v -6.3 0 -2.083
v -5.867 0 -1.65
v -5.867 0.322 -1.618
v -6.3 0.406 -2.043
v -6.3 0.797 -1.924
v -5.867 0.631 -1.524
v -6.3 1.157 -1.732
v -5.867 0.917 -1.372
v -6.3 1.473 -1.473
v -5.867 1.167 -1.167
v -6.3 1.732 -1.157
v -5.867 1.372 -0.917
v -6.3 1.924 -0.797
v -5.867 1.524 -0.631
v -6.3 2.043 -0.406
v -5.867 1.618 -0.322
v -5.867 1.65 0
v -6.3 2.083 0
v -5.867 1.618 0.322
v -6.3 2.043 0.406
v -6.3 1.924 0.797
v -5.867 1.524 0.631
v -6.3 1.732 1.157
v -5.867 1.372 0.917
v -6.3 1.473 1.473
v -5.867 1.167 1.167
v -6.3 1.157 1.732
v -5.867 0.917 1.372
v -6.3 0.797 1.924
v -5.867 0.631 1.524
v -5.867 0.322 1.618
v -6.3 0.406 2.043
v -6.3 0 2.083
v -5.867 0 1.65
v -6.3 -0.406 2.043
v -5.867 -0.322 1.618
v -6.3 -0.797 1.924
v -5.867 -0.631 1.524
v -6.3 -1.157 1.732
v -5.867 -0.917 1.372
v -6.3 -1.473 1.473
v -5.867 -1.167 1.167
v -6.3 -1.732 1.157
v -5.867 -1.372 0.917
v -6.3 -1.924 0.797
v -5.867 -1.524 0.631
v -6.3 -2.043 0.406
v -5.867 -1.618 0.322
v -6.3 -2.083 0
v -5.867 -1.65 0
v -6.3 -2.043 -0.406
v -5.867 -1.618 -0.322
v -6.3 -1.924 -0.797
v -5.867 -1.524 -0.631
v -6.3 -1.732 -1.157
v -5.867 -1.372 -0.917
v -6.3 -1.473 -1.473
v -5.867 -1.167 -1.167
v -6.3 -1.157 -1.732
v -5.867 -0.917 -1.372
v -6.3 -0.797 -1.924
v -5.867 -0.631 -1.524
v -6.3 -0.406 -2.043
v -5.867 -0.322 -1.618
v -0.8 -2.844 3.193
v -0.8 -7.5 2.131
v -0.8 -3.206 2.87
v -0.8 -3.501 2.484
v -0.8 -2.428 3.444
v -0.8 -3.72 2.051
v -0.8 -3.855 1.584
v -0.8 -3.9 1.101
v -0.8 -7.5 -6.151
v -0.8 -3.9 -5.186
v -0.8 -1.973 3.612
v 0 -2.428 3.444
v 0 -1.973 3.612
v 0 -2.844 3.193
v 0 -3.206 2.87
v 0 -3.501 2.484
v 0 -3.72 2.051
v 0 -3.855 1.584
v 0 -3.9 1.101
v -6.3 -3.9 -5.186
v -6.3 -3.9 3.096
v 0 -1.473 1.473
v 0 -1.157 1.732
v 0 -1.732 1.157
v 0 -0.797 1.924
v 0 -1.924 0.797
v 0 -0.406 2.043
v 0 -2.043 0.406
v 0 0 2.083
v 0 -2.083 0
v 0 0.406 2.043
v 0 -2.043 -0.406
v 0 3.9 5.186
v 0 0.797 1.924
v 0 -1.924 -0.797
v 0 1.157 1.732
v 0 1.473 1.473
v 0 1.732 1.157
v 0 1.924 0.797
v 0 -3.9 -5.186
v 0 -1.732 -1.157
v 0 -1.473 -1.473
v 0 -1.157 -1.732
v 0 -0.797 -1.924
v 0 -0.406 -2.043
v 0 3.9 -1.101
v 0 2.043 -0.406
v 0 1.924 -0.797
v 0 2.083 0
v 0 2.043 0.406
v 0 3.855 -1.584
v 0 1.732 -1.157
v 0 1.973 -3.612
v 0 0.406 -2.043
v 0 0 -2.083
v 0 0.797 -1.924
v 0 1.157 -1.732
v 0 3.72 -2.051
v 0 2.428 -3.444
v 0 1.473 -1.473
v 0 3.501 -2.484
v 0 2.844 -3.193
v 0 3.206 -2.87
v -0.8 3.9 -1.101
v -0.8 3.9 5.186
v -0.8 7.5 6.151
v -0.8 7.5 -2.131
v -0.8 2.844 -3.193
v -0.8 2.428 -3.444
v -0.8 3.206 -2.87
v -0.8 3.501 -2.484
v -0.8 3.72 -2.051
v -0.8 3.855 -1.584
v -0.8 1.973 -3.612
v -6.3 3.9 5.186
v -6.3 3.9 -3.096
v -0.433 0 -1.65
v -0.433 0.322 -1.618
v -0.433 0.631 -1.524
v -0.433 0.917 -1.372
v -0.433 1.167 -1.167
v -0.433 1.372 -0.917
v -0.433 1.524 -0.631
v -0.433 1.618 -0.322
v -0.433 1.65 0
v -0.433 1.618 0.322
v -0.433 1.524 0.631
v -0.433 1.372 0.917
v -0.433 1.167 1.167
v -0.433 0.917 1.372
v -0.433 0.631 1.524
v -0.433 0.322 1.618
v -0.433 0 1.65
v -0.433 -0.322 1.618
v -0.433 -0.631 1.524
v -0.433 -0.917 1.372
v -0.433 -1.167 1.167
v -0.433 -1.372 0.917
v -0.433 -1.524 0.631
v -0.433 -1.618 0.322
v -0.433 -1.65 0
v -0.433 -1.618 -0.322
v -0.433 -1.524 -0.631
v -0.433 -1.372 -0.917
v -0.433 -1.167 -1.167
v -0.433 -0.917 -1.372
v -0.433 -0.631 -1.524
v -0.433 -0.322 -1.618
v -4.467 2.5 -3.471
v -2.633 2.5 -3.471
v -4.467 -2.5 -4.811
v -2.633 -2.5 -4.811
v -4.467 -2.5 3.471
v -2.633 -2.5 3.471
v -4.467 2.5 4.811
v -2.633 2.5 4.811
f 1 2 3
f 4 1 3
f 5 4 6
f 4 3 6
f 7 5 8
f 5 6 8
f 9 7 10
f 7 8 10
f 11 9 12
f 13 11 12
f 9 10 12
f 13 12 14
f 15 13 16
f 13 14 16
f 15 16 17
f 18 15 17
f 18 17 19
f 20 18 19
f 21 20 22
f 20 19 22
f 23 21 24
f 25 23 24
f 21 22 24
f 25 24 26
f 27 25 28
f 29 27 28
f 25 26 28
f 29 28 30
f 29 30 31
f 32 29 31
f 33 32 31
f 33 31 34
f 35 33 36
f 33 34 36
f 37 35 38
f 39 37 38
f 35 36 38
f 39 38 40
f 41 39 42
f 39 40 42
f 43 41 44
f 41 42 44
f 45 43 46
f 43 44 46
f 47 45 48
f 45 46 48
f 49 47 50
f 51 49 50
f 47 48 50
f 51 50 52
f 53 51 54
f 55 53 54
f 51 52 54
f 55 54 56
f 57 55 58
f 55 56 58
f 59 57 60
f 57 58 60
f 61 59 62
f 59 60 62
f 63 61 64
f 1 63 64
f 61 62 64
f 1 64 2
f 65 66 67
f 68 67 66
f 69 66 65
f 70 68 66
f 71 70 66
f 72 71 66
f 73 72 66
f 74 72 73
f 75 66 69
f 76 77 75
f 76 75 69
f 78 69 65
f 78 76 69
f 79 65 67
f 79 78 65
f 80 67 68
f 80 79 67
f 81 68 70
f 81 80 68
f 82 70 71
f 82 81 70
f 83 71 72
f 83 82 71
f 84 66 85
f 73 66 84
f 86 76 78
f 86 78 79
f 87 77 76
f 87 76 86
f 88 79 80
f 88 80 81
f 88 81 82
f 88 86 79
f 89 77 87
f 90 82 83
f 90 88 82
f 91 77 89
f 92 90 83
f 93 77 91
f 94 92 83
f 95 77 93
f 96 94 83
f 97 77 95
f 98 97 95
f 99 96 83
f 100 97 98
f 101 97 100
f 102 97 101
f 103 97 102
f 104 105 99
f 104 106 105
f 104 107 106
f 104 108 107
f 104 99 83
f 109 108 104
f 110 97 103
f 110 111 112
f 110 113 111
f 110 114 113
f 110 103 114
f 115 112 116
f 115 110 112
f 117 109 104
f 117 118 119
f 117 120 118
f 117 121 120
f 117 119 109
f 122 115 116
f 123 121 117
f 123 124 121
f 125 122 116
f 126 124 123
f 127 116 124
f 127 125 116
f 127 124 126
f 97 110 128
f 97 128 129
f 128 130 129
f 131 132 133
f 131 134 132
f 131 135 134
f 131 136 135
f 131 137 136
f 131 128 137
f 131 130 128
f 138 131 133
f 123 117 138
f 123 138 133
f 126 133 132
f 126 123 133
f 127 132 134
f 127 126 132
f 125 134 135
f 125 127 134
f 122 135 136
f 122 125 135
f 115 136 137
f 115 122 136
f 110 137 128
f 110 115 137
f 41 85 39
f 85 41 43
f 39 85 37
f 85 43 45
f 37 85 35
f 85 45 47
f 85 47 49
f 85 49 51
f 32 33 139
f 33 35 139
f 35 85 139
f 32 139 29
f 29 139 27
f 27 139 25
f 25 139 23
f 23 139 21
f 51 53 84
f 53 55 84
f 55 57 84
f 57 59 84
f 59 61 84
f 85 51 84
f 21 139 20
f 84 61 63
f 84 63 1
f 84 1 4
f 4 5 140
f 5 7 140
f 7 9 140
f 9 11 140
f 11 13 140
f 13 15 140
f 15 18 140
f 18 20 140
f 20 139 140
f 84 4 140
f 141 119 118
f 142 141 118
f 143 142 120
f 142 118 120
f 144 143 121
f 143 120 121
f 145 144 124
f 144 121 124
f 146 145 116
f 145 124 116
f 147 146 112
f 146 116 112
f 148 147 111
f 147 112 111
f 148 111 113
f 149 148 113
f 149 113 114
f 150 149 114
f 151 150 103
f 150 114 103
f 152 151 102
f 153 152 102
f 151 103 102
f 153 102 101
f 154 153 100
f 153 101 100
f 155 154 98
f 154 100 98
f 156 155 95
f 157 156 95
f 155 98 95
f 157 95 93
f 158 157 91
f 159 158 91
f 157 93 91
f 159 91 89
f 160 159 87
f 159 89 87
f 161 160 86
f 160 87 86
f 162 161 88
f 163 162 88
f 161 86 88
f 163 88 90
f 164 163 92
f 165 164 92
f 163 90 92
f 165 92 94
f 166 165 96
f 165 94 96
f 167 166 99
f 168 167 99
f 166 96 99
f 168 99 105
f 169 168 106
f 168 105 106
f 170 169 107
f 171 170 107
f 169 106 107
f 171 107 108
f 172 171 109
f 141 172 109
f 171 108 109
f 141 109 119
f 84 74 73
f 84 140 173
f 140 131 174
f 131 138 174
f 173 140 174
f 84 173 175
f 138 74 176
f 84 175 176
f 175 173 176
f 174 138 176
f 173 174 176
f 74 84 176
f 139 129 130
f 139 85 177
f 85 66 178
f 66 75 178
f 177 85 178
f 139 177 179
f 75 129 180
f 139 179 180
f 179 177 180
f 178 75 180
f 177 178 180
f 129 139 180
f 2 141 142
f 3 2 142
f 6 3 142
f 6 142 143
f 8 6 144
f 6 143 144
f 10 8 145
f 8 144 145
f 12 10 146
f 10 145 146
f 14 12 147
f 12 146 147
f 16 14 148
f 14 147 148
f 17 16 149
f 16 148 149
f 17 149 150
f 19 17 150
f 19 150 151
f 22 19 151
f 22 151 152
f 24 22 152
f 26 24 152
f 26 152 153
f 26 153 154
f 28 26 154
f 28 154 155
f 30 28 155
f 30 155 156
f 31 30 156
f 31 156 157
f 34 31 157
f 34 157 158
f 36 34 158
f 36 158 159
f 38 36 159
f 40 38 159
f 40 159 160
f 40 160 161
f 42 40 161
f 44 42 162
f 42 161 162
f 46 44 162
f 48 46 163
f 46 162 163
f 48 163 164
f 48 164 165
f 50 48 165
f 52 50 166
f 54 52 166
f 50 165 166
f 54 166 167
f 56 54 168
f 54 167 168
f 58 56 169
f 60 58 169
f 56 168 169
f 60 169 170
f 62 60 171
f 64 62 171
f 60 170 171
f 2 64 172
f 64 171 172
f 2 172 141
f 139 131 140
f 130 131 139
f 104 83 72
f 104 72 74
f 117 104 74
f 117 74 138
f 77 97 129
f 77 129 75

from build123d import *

# Parameters (mm, degrees)
EXTRUDE1_DEPTH        = 0.8
EXTRUDE2_DEPTH        = 5.5
DRAFT1_ANGLE          = -33.206570315
DRAFT2_ANGLE          = -33.206570315
M4_TAPPED_HOLE1_D     = 3.3
M4_TAPPED_HOLE1_DEPTH = 6.3
CHAMFER1_SIZE         = 0.433


with BuildPart() as part:
    # Sketch1 → Extrude1 (new body)
    with BuildSketch(Plane(origin=(0, 0, 0), x_dir=(0, 0, -1), z_dir=(1, 0, 0))):
        with BuildLine():
            Line((1.101052702, 3.9), (-5.186106572, 3.9))
            Line((-5.186106572, 3.9), (-3.612459851, -1.972929517))
            ThreePointArc((-3.612459851, -1.972929517), (-2.683832418, -3.362718685), (-1.101052702, -3.9))
            Line((-1.101052702, -3.9), (5.186106572, -3.9))
            Line((5.186106572, -3.9), (3.612459851, 1.972929517))
            ThreePointArc((3.612459851, 1.972929517), (2.683832418, 3.362718685), (1.101052702, 3.9))
        make_face()
    extrude(amount=-EXTRUDE1_DEPTH)

    # Sketch2 → Extrude2 (add)
    with BuildSketch(Plane.ZY.offset(0.8)):
        with BuildLine():
            Line((2.131485778, -7.5), (-6.150723665, -7.5))
            add(Edge.make_bspline(
                [(-2.131485778, 7.5), (-3.471231741, 2.5), (-4.810977703, -2.5), (-6.150723665, -7.5)],
                knots=[0, 0, 0, 0, 1, 1, 1, 1], degree=3))
            Line((-2.131485778, 7.5), (6.150723665, 7.5))
            add(Edge.make_bspline(
                [(2.131485778, -7.5), (3.471231741, -2.5), (4.810977703, 2.5), (6.150723665, 7.5)],
                knots=[0, 0, 0, 0, 1, 1, 1, 1], degree=3))
        make_face()
    extrude(amount=EXTRUDE2_DEPTH)

    # Draft1
    draft1_faces = [part.faces().sort_by_distance(p)[0] for p in [
        (-3.55, 7.5, 2.009618943),
    ]]
    draft(draft1_faces, Plane(origin=(-0.8, 0, 4.141104722), x_dir=(0, 0, 1), z_dir=(1, 0, 0)), DRAFT1_ANGLE)

    # Draft2
    draft2_faces = [part.faces().sort_by_distance(p)[0] for p in [
        (-3.55, -7.5, -2.009618943),
    ]]
    draft(draft2_faces, Plane(origin=(-0.8, 0, 4.141104722), x_dir=(0, 0, 1), z_dir=(1, 0, 0)), DRAFT2_ANGLE)

    # M4 Tapped Hole1
    with Locations(Plane.ZY.offset(6.3)):
        with Locations((0, 0)):
            Hole(M4_TAPPED_HOLE1_D / 2, depth=M4_TAPPED_HOLE1_DEPTH)

    # Chamfer1
    chamfer1_edges = [part.edges().sort_by_distance(p)[0] for p in [
        (-6.3, 0, 1.65),
        (0, 0, 1.65),
    ]]
    chamfer(chamfer1_edges, length=CHAMFER1_SIZE)


solid = part.part
